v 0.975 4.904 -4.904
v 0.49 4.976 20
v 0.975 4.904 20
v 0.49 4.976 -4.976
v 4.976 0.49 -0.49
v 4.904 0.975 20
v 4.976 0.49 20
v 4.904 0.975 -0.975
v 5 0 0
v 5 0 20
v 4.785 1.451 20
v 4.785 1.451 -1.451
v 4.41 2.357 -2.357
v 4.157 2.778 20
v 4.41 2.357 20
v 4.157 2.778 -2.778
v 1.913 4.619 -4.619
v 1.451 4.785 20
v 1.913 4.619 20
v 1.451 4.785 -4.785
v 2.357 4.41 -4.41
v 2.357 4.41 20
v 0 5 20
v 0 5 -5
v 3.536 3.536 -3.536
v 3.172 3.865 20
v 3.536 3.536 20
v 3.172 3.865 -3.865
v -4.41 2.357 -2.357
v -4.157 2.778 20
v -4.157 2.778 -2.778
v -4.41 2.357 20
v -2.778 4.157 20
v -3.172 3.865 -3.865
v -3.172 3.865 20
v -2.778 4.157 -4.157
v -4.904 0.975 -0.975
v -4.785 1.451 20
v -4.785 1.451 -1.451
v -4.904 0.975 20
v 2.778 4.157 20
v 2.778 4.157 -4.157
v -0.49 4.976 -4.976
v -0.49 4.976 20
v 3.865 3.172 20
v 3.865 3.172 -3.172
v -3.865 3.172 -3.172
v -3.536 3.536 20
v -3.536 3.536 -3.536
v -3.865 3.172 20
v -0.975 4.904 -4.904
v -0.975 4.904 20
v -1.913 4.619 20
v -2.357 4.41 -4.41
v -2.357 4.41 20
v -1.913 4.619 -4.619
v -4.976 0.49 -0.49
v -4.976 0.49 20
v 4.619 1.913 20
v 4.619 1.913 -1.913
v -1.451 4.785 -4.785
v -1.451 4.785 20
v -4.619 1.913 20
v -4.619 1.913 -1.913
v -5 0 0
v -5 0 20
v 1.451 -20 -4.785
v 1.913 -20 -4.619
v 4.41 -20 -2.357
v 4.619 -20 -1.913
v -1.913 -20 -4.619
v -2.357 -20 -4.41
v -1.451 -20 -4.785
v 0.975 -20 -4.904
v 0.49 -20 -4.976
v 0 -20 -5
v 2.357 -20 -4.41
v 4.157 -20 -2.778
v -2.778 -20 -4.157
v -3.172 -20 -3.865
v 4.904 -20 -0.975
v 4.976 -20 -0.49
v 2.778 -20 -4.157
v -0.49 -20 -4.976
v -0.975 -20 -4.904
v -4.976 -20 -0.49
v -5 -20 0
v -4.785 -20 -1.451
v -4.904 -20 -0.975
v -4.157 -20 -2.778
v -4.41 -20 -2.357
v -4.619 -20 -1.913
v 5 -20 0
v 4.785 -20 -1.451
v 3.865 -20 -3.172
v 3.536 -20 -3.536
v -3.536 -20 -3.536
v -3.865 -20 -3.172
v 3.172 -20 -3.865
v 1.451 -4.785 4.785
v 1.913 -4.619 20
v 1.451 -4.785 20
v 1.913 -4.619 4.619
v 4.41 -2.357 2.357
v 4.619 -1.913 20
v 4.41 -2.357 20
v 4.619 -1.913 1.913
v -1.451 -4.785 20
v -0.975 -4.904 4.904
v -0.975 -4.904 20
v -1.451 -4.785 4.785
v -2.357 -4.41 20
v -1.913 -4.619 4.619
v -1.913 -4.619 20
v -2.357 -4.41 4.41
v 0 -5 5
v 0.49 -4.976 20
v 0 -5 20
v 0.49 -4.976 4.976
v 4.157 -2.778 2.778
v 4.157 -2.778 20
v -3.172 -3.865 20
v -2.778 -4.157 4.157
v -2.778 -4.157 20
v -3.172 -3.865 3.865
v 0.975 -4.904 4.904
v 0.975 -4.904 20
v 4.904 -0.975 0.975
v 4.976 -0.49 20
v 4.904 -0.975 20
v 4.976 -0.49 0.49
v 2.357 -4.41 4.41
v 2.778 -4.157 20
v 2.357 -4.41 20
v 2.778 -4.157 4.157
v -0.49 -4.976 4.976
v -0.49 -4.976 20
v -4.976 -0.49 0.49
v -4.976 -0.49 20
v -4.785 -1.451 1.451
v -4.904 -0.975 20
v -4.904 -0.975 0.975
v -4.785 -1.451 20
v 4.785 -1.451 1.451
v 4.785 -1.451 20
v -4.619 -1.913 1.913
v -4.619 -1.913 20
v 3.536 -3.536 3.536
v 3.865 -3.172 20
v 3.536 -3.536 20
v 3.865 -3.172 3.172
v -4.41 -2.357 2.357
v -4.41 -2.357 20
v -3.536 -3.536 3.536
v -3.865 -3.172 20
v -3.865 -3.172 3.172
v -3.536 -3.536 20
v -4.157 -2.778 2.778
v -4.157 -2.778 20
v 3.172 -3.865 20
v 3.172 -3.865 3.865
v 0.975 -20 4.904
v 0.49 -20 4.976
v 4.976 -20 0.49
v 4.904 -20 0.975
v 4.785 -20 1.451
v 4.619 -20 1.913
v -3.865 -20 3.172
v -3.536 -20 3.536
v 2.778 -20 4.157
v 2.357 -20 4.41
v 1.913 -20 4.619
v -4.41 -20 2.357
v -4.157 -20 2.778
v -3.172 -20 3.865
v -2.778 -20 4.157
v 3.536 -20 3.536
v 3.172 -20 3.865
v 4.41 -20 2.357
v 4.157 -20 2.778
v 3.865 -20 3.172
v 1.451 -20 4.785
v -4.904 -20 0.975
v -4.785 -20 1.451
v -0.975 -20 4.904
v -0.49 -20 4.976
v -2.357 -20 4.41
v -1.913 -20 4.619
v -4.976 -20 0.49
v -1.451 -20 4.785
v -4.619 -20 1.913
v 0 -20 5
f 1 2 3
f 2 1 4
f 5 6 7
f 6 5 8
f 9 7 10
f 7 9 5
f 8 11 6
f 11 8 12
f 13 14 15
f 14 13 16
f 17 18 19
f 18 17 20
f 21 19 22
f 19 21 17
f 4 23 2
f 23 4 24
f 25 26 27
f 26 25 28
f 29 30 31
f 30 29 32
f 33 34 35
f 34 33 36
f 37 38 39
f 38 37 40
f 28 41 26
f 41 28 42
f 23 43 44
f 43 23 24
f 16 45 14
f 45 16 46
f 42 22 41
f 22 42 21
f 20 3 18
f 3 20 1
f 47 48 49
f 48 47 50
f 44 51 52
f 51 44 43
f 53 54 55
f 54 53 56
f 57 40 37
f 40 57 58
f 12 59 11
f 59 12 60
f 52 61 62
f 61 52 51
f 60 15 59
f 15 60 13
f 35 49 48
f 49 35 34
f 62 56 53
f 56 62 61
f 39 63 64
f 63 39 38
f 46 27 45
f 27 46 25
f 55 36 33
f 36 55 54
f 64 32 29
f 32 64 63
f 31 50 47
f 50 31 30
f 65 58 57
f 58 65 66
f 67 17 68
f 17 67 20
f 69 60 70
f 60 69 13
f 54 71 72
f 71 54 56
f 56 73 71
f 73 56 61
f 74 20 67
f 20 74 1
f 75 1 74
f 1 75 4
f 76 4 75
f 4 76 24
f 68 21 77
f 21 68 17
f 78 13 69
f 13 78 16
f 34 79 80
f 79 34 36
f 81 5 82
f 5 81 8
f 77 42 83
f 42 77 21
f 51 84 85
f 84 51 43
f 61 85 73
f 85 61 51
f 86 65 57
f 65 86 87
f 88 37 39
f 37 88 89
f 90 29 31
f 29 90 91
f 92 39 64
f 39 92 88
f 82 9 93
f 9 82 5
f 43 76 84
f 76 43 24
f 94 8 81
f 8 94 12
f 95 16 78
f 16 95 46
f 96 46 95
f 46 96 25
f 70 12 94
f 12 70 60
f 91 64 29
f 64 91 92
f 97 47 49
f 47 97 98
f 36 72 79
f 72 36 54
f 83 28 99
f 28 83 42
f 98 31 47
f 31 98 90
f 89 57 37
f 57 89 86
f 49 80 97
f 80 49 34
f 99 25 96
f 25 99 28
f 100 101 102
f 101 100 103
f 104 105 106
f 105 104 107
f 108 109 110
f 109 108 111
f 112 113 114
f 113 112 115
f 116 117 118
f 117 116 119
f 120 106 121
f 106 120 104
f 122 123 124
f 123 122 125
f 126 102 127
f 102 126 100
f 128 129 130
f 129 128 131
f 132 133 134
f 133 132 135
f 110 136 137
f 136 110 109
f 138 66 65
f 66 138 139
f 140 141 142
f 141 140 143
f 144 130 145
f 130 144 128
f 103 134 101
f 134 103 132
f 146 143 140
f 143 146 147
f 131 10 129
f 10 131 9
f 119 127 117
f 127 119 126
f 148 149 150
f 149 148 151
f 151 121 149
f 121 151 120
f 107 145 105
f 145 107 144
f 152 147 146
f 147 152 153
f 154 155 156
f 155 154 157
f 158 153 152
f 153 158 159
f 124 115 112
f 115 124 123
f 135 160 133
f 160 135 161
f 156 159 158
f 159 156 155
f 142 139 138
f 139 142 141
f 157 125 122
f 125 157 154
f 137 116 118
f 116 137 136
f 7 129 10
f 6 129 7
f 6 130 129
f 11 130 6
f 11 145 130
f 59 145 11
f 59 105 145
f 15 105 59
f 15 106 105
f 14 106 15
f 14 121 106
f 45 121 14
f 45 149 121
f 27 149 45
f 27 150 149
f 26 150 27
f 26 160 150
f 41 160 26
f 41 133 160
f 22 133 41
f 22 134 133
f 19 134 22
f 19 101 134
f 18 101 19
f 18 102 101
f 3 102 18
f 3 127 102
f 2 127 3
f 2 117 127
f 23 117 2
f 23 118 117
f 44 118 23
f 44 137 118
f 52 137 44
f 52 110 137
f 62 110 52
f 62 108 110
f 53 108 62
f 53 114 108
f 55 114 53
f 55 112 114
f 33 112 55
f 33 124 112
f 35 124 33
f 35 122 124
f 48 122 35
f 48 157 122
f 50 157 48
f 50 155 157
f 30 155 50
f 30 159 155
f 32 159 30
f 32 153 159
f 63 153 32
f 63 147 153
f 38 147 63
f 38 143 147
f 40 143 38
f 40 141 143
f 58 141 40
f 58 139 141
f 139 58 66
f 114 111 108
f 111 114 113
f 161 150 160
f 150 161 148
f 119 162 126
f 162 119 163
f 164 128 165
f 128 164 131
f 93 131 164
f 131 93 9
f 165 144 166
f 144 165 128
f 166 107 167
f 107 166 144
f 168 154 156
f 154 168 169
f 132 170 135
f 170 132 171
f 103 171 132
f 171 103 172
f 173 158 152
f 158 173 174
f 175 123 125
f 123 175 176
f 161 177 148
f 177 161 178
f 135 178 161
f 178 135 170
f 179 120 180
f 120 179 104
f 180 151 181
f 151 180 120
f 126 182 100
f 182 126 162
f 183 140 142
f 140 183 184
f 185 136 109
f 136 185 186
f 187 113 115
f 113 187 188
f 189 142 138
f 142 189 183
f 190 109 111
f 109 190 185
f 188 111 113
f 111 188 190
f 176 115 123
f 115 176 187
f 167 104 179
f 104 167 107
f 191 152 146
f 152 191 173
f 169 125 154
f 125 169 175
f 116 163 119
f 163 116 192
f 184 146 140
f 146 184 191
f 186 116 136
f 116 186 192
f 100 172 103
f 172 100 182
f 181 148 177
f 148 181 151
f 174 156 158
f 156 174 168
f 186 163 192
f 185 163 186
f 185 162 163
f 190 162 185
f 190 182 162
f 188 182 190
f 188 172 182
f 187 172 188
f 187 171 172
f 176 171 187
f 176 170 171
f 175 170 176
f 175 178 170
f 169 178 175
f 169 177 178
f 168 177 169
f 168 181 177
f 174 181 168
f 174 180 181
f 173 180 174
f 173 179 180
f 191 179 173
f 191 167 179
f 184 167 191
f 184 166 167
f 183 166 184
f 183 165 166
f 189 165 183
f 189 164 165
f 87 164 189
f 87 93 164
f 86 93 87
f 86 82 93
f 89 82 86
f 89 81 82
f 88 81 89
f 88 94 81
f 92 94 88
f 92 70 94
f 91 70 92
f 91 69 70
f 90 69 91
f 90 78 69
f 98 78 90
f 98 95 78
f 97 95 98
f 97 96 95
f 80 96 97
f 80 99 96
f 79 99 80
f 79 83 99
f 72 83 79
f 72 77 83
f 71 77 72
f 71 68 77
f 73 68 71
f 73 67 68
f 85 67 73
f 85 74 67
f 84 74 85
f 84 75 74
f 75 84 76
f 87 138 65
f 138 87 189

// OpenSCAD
$fn= $preview ? 32 : 64;
cylinder(20,5,5);
rotate([90,0,0]) cylinder(20,5,5);
intersection() {translate([0,0,-5])cylinder(20,5,5);
    translate([0,5,0])rotate([90,0,0]) cylinder(20,5,5);}
